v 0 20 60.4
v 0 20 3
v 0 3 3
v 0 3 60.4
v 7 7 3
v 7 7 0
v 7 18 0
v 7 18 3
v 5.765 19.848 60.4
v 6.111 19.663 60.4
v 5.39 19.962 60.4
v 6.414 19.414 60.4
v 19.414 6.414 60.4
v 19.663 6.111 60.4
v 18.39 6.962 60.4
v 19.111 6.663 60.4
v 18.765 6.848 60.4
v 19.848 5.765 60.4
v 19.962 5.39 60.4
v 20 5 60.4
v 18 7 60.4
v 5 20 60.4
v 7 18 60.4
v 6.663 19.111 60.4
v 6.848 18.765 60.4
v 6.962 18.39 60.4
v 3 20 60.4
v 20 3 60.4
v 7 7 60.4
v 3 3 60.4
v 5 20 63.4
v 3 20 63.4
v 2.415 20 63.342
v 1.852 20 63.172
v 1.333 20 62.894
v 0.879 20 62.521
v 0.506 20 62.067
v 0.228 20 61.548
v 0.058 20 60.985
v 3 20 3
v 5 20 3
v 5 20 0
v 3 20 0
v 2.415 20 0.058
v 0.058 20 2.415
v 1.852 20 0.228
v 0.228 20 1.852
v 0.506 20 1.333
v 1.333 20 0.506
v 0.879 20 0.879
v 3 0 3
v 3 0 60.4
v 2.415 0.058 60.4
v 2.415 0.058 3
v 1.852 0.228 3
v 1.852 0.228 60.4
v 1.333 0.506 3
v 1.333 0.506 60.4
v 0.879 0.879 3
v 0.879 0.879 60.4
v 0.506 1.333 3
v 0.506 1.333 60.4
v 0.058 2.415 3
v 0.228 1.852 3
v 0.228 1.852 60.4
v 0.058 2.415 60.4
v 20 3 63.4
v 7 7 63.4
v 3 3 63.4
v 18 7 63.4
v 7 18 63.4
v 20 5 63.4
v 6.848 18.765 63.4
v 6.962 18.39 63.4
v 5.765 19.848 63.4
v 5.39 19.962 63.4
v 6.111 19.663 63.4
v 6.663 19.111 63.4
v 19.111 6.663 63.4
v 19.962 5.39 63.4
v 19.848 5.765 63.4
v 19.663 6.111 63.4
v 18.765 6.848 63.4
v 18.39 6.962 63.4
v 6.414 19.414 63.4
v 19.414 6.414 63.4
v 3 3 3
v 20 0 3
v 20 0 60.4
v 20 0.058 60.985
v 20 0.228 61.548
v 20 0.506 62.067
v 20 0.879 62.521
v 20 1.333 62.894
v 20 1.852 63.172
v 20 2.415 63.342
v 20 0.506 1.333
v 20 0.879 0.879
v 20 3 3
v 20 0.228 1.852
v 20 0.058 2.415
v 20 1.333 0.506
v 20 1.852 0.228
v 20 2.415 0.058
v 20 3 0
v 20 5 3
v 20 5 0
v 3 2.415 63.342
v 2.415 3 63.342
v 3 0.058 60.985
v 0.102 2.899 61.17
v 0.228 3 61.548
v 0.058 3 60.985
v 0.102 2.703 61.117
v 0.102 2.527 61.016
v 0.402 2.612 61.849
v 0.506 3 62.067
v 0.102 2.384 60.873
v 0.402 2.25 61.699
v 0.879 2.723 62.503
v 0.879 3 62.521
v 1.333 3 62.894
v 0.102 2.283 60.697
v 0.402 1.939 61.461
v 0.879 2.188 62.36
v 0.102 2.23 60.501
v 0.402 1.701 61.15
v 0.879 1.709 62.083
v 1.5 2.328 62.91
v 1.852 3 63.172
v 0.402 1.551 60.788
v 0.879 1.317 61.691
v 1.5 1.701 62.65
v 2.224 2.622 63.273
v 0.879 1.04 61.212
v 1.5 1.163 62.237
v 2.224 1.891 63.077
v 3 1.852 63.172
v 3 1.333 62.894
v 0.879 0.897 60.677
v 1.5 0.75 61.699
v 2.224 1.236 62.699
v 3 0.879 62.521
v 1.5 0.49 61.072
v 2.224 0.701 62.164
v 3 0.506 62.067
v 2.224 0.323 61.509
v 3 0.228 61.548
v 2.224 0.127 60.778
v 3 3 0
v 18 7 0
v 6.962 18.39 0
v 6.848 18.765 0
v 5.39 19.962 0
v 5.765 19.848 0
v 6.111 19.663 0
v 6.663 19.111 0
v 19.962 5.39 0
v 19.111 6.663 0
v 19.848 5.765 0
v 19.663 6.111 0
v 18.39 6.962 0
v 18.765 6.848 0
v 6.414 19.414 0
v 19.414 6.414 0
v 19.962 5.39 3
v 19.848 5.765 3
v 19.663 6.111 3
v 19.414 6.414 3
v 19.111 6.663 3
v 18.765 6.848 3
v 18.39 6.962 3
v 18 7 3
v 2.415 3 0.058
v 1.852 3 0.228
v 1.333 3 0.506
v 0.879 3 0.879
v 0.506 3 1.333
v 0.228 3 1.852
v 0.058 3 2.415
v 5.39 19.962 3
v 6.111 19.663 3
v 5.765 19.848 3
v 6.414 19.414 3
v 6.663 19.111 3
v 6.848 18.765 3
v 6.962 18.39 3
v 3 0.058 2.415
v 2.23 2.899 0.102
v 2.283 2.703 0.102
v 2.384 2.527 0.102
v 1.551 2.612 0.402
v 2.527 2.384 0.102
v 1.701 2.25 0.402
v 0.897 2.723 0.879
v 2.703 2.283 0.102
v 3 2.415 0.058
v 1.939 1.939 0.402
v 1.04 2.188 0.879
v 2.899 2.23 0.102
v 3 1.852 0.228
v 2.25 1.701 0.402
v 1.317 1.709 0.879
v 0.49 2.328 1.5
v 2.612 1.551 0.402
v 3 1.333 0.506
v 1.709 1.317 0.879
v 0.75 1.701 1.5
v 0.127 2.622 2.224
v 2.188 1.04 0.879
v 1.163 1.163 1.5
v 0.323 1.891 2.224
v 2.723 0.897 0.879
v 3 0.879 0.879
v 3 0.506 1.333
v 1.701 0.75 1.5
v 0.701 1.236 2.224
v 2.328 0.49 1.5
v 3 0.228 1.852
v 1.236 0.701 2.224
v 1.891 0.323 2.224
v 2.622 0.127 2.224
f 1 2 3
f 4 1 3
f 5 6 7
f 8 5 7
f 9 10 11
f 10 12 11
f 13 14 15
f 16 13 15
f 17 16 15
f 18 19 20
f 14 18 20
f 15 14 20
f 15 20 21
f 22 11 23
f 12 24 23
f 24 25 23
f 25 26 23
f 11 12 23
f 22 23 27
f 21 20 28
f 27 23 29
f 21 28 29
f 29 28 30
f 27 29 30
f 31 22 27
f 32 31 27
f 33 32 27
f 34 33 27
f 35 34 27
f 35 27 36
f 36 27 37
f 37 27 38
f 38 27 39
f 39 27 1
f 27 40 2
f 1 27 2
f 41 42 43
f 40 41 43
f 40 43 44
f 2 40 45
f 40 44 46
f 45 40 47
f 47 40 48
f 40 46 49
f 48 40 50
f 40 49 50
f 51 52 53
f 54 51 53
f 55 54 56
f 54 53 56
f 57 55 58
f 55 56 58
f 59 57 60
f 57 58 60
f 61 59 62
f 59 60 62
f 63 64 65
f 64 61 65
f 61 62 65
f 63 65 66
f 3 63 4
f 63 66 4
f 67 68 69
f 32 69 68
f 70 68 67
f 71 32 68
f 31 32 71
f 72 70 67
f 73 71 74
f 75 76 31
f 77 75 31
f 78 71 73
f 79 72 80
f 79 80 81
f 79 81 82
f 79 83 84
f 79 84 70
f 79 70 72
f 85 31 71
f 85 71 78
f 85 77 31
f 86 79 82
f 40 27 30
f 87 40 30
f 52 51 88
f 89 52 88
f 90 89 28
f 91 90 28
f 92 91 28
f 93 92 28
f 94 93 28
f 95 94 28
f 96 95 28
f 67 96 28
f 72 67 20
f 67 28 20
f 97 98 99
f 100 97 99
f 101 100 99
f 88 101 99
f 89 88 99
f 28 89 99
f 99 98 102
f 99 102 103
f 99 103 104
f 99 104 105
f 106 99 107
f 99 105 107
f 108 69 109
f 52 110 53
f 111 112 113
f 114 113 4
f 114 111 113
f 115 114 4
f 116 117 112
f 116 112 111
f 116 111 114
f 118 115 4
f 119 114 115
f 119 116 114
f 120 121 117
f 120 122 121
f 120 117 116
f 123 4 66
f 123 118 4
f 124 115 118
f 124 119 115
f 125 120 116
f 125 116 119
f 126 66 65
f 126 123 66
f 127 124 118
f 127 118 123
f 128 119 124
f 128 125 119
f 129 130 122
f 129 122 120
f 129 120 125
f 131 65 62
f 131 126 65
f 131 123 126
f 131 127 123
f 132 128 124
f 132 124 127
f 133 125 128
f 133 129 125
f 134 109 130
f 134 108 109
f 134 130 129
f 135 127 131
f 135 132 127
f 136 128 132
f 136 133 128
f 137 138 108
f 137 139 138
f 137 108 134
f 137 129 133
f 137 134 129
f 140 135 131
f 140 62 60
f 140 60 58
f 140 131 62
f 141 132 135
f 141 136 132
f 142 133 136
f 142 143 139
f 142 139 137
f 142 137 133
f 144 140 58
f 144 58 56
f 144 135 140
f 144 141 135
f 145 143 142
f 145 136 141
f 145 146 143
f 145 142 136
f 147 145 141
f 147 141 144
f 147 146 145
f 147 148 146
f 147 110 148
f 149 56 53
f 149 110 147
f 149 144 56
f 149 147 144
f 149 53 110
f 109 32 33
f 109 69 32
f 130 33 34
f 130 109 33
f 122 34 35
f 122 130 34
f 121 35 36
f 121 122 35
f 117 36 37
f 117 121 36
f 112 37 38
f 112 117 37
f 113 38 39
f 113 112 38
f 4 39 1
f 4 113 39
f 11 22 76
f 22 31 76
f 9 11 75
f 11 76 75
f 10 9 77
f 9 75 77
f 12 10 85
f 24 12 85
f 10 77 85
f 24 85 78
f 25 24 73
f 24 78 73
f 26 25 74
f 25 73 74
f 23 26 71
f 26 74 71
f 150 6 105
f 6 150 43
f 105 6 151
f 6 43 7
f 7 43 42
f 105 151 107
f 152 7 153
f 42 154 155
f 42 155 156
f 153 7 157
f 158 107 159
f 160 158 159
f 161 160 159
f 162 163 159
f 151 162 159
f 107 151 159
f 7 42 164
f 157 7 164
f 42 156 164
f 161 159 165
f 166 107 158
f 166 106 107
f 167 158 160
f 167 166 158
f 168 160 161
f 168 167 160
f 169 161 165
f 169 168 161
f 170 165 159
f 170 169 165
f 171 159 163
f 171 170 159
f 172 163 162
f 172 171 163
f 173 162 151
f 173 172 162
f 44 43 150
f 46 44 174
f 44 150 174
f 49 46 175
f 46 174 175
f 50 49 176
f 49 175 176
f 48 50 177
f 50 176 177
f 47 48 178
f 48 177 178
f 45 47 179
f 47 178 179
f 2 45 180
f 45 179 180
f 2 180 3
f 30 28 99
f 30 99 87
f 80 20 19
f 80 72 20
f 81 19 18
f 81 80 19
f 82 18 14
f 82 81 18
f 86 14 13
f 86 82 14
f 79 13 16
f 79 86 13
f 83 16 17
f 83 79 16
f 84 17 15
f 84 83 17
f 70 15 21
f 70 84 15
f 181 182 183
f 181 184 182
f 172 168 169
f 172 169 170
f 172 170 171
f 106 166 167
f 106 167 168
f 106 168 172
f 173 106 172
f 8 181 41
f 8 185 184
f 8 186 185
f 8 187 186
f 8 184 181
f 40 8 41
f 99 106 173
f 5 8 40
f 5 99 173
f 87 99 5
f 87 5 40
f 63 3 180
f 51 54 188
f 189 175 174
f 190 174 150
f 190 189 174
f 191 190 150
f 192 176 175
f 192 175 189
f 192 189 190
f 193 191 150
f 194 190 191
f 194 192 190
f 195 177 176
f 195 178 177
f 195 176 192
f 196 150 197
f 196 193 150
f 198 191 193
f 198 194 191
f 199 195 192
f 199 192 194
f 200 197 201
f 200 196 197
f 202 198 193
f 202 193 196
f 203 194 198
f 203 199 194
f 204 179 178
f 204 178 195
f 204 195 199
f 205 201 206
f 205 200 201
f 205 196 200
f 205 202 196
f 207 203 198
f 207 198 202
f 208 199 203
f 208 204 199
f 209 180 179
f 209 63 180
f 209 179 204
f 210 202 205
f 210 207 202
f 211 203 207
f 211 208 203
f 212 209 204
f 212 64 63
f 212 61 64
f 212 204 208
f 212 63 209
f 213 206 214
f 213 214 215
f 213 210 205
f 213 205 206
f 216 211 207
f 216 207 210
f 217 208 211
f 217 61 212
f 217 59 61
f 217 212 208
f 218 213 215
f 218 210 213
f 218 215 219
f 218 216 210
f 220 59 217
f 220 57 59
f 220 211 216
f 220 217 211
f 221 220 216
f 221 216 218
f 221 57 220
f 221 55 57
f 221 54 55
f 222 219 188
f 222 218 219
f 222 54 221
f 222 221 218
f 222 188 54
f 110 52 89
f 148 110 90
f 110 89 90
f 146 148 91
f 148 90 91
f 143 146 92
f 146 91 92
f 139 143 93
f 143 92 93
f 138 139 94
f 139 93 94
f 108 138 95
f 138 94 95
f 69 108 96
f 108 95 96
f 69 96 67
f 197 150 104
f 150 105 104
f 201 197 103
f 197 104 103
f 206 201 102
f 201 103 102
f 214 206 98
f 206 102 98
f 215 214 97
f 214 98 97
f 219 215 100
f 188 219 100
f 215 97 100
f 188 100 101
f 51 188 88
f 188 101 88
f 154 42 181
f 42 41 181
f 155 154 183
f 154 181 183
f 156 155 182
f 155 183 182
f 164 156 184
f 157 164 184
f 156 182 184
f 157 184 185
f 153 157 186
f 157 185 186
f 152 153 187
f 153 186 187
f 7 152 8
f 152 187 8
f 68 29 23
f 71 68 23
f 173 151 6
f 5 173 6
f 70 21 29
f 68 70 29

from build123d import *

# Parameters (mm, degrees)
PAD_DEPTH    = 63.4
SKETCH001_W  = 20
SKETCH001_H  = 20
POCKET_DEPTH = 57.4
FILLET_R     = 2
FILLET001_R  = 3


with BuildPart() as part:
    # Sketch → Pad (new body)
    with BuildSketch(Plane.XY):
        Polygon((0, 0), (20, 0), (20, 7), (7, 7), (7, 20), (0, 20), align=None)
    extrude(amount=PAD_DEPTH)

    # Sketch001 (on DatumPlane) → Pocket (cut)
    with BuildSketch(Plane(origin=(0, 0, 3), x_dir=(-1, 0, 0), z_dir=(0, 0, 1))):
        with Locations((-13, -13)):
            Rectangle(SKETCH001_W, SKETCH001_H)
    extrude(amount=POCKET_DEPTH, mode=Mode.SUBTRACT)

    # Fillet
    fillet_edges = [part.edges().sort_by_distance(p)[0] for p in [
        (7, 20, 61.9),
        (20, 7, 61.9),
        (7, 20, 1.5),
        (20, 7, 1.5),
    ]]
    fillet(fillet_edges, radius=FILLET_R)

    # Fillet001
    fillet001_edges = [part.edges().sort_by_distance(p)[0] for p in [
        (10, 0, 63.4),
        (0, 10, 63.4),
        (0, 0, 31.7),
        (0, 10, 0),
        (10, 0, 0),
    ]]
    fillet(fillet001_edges, radius=FILLET001_R)


solid = part.part
